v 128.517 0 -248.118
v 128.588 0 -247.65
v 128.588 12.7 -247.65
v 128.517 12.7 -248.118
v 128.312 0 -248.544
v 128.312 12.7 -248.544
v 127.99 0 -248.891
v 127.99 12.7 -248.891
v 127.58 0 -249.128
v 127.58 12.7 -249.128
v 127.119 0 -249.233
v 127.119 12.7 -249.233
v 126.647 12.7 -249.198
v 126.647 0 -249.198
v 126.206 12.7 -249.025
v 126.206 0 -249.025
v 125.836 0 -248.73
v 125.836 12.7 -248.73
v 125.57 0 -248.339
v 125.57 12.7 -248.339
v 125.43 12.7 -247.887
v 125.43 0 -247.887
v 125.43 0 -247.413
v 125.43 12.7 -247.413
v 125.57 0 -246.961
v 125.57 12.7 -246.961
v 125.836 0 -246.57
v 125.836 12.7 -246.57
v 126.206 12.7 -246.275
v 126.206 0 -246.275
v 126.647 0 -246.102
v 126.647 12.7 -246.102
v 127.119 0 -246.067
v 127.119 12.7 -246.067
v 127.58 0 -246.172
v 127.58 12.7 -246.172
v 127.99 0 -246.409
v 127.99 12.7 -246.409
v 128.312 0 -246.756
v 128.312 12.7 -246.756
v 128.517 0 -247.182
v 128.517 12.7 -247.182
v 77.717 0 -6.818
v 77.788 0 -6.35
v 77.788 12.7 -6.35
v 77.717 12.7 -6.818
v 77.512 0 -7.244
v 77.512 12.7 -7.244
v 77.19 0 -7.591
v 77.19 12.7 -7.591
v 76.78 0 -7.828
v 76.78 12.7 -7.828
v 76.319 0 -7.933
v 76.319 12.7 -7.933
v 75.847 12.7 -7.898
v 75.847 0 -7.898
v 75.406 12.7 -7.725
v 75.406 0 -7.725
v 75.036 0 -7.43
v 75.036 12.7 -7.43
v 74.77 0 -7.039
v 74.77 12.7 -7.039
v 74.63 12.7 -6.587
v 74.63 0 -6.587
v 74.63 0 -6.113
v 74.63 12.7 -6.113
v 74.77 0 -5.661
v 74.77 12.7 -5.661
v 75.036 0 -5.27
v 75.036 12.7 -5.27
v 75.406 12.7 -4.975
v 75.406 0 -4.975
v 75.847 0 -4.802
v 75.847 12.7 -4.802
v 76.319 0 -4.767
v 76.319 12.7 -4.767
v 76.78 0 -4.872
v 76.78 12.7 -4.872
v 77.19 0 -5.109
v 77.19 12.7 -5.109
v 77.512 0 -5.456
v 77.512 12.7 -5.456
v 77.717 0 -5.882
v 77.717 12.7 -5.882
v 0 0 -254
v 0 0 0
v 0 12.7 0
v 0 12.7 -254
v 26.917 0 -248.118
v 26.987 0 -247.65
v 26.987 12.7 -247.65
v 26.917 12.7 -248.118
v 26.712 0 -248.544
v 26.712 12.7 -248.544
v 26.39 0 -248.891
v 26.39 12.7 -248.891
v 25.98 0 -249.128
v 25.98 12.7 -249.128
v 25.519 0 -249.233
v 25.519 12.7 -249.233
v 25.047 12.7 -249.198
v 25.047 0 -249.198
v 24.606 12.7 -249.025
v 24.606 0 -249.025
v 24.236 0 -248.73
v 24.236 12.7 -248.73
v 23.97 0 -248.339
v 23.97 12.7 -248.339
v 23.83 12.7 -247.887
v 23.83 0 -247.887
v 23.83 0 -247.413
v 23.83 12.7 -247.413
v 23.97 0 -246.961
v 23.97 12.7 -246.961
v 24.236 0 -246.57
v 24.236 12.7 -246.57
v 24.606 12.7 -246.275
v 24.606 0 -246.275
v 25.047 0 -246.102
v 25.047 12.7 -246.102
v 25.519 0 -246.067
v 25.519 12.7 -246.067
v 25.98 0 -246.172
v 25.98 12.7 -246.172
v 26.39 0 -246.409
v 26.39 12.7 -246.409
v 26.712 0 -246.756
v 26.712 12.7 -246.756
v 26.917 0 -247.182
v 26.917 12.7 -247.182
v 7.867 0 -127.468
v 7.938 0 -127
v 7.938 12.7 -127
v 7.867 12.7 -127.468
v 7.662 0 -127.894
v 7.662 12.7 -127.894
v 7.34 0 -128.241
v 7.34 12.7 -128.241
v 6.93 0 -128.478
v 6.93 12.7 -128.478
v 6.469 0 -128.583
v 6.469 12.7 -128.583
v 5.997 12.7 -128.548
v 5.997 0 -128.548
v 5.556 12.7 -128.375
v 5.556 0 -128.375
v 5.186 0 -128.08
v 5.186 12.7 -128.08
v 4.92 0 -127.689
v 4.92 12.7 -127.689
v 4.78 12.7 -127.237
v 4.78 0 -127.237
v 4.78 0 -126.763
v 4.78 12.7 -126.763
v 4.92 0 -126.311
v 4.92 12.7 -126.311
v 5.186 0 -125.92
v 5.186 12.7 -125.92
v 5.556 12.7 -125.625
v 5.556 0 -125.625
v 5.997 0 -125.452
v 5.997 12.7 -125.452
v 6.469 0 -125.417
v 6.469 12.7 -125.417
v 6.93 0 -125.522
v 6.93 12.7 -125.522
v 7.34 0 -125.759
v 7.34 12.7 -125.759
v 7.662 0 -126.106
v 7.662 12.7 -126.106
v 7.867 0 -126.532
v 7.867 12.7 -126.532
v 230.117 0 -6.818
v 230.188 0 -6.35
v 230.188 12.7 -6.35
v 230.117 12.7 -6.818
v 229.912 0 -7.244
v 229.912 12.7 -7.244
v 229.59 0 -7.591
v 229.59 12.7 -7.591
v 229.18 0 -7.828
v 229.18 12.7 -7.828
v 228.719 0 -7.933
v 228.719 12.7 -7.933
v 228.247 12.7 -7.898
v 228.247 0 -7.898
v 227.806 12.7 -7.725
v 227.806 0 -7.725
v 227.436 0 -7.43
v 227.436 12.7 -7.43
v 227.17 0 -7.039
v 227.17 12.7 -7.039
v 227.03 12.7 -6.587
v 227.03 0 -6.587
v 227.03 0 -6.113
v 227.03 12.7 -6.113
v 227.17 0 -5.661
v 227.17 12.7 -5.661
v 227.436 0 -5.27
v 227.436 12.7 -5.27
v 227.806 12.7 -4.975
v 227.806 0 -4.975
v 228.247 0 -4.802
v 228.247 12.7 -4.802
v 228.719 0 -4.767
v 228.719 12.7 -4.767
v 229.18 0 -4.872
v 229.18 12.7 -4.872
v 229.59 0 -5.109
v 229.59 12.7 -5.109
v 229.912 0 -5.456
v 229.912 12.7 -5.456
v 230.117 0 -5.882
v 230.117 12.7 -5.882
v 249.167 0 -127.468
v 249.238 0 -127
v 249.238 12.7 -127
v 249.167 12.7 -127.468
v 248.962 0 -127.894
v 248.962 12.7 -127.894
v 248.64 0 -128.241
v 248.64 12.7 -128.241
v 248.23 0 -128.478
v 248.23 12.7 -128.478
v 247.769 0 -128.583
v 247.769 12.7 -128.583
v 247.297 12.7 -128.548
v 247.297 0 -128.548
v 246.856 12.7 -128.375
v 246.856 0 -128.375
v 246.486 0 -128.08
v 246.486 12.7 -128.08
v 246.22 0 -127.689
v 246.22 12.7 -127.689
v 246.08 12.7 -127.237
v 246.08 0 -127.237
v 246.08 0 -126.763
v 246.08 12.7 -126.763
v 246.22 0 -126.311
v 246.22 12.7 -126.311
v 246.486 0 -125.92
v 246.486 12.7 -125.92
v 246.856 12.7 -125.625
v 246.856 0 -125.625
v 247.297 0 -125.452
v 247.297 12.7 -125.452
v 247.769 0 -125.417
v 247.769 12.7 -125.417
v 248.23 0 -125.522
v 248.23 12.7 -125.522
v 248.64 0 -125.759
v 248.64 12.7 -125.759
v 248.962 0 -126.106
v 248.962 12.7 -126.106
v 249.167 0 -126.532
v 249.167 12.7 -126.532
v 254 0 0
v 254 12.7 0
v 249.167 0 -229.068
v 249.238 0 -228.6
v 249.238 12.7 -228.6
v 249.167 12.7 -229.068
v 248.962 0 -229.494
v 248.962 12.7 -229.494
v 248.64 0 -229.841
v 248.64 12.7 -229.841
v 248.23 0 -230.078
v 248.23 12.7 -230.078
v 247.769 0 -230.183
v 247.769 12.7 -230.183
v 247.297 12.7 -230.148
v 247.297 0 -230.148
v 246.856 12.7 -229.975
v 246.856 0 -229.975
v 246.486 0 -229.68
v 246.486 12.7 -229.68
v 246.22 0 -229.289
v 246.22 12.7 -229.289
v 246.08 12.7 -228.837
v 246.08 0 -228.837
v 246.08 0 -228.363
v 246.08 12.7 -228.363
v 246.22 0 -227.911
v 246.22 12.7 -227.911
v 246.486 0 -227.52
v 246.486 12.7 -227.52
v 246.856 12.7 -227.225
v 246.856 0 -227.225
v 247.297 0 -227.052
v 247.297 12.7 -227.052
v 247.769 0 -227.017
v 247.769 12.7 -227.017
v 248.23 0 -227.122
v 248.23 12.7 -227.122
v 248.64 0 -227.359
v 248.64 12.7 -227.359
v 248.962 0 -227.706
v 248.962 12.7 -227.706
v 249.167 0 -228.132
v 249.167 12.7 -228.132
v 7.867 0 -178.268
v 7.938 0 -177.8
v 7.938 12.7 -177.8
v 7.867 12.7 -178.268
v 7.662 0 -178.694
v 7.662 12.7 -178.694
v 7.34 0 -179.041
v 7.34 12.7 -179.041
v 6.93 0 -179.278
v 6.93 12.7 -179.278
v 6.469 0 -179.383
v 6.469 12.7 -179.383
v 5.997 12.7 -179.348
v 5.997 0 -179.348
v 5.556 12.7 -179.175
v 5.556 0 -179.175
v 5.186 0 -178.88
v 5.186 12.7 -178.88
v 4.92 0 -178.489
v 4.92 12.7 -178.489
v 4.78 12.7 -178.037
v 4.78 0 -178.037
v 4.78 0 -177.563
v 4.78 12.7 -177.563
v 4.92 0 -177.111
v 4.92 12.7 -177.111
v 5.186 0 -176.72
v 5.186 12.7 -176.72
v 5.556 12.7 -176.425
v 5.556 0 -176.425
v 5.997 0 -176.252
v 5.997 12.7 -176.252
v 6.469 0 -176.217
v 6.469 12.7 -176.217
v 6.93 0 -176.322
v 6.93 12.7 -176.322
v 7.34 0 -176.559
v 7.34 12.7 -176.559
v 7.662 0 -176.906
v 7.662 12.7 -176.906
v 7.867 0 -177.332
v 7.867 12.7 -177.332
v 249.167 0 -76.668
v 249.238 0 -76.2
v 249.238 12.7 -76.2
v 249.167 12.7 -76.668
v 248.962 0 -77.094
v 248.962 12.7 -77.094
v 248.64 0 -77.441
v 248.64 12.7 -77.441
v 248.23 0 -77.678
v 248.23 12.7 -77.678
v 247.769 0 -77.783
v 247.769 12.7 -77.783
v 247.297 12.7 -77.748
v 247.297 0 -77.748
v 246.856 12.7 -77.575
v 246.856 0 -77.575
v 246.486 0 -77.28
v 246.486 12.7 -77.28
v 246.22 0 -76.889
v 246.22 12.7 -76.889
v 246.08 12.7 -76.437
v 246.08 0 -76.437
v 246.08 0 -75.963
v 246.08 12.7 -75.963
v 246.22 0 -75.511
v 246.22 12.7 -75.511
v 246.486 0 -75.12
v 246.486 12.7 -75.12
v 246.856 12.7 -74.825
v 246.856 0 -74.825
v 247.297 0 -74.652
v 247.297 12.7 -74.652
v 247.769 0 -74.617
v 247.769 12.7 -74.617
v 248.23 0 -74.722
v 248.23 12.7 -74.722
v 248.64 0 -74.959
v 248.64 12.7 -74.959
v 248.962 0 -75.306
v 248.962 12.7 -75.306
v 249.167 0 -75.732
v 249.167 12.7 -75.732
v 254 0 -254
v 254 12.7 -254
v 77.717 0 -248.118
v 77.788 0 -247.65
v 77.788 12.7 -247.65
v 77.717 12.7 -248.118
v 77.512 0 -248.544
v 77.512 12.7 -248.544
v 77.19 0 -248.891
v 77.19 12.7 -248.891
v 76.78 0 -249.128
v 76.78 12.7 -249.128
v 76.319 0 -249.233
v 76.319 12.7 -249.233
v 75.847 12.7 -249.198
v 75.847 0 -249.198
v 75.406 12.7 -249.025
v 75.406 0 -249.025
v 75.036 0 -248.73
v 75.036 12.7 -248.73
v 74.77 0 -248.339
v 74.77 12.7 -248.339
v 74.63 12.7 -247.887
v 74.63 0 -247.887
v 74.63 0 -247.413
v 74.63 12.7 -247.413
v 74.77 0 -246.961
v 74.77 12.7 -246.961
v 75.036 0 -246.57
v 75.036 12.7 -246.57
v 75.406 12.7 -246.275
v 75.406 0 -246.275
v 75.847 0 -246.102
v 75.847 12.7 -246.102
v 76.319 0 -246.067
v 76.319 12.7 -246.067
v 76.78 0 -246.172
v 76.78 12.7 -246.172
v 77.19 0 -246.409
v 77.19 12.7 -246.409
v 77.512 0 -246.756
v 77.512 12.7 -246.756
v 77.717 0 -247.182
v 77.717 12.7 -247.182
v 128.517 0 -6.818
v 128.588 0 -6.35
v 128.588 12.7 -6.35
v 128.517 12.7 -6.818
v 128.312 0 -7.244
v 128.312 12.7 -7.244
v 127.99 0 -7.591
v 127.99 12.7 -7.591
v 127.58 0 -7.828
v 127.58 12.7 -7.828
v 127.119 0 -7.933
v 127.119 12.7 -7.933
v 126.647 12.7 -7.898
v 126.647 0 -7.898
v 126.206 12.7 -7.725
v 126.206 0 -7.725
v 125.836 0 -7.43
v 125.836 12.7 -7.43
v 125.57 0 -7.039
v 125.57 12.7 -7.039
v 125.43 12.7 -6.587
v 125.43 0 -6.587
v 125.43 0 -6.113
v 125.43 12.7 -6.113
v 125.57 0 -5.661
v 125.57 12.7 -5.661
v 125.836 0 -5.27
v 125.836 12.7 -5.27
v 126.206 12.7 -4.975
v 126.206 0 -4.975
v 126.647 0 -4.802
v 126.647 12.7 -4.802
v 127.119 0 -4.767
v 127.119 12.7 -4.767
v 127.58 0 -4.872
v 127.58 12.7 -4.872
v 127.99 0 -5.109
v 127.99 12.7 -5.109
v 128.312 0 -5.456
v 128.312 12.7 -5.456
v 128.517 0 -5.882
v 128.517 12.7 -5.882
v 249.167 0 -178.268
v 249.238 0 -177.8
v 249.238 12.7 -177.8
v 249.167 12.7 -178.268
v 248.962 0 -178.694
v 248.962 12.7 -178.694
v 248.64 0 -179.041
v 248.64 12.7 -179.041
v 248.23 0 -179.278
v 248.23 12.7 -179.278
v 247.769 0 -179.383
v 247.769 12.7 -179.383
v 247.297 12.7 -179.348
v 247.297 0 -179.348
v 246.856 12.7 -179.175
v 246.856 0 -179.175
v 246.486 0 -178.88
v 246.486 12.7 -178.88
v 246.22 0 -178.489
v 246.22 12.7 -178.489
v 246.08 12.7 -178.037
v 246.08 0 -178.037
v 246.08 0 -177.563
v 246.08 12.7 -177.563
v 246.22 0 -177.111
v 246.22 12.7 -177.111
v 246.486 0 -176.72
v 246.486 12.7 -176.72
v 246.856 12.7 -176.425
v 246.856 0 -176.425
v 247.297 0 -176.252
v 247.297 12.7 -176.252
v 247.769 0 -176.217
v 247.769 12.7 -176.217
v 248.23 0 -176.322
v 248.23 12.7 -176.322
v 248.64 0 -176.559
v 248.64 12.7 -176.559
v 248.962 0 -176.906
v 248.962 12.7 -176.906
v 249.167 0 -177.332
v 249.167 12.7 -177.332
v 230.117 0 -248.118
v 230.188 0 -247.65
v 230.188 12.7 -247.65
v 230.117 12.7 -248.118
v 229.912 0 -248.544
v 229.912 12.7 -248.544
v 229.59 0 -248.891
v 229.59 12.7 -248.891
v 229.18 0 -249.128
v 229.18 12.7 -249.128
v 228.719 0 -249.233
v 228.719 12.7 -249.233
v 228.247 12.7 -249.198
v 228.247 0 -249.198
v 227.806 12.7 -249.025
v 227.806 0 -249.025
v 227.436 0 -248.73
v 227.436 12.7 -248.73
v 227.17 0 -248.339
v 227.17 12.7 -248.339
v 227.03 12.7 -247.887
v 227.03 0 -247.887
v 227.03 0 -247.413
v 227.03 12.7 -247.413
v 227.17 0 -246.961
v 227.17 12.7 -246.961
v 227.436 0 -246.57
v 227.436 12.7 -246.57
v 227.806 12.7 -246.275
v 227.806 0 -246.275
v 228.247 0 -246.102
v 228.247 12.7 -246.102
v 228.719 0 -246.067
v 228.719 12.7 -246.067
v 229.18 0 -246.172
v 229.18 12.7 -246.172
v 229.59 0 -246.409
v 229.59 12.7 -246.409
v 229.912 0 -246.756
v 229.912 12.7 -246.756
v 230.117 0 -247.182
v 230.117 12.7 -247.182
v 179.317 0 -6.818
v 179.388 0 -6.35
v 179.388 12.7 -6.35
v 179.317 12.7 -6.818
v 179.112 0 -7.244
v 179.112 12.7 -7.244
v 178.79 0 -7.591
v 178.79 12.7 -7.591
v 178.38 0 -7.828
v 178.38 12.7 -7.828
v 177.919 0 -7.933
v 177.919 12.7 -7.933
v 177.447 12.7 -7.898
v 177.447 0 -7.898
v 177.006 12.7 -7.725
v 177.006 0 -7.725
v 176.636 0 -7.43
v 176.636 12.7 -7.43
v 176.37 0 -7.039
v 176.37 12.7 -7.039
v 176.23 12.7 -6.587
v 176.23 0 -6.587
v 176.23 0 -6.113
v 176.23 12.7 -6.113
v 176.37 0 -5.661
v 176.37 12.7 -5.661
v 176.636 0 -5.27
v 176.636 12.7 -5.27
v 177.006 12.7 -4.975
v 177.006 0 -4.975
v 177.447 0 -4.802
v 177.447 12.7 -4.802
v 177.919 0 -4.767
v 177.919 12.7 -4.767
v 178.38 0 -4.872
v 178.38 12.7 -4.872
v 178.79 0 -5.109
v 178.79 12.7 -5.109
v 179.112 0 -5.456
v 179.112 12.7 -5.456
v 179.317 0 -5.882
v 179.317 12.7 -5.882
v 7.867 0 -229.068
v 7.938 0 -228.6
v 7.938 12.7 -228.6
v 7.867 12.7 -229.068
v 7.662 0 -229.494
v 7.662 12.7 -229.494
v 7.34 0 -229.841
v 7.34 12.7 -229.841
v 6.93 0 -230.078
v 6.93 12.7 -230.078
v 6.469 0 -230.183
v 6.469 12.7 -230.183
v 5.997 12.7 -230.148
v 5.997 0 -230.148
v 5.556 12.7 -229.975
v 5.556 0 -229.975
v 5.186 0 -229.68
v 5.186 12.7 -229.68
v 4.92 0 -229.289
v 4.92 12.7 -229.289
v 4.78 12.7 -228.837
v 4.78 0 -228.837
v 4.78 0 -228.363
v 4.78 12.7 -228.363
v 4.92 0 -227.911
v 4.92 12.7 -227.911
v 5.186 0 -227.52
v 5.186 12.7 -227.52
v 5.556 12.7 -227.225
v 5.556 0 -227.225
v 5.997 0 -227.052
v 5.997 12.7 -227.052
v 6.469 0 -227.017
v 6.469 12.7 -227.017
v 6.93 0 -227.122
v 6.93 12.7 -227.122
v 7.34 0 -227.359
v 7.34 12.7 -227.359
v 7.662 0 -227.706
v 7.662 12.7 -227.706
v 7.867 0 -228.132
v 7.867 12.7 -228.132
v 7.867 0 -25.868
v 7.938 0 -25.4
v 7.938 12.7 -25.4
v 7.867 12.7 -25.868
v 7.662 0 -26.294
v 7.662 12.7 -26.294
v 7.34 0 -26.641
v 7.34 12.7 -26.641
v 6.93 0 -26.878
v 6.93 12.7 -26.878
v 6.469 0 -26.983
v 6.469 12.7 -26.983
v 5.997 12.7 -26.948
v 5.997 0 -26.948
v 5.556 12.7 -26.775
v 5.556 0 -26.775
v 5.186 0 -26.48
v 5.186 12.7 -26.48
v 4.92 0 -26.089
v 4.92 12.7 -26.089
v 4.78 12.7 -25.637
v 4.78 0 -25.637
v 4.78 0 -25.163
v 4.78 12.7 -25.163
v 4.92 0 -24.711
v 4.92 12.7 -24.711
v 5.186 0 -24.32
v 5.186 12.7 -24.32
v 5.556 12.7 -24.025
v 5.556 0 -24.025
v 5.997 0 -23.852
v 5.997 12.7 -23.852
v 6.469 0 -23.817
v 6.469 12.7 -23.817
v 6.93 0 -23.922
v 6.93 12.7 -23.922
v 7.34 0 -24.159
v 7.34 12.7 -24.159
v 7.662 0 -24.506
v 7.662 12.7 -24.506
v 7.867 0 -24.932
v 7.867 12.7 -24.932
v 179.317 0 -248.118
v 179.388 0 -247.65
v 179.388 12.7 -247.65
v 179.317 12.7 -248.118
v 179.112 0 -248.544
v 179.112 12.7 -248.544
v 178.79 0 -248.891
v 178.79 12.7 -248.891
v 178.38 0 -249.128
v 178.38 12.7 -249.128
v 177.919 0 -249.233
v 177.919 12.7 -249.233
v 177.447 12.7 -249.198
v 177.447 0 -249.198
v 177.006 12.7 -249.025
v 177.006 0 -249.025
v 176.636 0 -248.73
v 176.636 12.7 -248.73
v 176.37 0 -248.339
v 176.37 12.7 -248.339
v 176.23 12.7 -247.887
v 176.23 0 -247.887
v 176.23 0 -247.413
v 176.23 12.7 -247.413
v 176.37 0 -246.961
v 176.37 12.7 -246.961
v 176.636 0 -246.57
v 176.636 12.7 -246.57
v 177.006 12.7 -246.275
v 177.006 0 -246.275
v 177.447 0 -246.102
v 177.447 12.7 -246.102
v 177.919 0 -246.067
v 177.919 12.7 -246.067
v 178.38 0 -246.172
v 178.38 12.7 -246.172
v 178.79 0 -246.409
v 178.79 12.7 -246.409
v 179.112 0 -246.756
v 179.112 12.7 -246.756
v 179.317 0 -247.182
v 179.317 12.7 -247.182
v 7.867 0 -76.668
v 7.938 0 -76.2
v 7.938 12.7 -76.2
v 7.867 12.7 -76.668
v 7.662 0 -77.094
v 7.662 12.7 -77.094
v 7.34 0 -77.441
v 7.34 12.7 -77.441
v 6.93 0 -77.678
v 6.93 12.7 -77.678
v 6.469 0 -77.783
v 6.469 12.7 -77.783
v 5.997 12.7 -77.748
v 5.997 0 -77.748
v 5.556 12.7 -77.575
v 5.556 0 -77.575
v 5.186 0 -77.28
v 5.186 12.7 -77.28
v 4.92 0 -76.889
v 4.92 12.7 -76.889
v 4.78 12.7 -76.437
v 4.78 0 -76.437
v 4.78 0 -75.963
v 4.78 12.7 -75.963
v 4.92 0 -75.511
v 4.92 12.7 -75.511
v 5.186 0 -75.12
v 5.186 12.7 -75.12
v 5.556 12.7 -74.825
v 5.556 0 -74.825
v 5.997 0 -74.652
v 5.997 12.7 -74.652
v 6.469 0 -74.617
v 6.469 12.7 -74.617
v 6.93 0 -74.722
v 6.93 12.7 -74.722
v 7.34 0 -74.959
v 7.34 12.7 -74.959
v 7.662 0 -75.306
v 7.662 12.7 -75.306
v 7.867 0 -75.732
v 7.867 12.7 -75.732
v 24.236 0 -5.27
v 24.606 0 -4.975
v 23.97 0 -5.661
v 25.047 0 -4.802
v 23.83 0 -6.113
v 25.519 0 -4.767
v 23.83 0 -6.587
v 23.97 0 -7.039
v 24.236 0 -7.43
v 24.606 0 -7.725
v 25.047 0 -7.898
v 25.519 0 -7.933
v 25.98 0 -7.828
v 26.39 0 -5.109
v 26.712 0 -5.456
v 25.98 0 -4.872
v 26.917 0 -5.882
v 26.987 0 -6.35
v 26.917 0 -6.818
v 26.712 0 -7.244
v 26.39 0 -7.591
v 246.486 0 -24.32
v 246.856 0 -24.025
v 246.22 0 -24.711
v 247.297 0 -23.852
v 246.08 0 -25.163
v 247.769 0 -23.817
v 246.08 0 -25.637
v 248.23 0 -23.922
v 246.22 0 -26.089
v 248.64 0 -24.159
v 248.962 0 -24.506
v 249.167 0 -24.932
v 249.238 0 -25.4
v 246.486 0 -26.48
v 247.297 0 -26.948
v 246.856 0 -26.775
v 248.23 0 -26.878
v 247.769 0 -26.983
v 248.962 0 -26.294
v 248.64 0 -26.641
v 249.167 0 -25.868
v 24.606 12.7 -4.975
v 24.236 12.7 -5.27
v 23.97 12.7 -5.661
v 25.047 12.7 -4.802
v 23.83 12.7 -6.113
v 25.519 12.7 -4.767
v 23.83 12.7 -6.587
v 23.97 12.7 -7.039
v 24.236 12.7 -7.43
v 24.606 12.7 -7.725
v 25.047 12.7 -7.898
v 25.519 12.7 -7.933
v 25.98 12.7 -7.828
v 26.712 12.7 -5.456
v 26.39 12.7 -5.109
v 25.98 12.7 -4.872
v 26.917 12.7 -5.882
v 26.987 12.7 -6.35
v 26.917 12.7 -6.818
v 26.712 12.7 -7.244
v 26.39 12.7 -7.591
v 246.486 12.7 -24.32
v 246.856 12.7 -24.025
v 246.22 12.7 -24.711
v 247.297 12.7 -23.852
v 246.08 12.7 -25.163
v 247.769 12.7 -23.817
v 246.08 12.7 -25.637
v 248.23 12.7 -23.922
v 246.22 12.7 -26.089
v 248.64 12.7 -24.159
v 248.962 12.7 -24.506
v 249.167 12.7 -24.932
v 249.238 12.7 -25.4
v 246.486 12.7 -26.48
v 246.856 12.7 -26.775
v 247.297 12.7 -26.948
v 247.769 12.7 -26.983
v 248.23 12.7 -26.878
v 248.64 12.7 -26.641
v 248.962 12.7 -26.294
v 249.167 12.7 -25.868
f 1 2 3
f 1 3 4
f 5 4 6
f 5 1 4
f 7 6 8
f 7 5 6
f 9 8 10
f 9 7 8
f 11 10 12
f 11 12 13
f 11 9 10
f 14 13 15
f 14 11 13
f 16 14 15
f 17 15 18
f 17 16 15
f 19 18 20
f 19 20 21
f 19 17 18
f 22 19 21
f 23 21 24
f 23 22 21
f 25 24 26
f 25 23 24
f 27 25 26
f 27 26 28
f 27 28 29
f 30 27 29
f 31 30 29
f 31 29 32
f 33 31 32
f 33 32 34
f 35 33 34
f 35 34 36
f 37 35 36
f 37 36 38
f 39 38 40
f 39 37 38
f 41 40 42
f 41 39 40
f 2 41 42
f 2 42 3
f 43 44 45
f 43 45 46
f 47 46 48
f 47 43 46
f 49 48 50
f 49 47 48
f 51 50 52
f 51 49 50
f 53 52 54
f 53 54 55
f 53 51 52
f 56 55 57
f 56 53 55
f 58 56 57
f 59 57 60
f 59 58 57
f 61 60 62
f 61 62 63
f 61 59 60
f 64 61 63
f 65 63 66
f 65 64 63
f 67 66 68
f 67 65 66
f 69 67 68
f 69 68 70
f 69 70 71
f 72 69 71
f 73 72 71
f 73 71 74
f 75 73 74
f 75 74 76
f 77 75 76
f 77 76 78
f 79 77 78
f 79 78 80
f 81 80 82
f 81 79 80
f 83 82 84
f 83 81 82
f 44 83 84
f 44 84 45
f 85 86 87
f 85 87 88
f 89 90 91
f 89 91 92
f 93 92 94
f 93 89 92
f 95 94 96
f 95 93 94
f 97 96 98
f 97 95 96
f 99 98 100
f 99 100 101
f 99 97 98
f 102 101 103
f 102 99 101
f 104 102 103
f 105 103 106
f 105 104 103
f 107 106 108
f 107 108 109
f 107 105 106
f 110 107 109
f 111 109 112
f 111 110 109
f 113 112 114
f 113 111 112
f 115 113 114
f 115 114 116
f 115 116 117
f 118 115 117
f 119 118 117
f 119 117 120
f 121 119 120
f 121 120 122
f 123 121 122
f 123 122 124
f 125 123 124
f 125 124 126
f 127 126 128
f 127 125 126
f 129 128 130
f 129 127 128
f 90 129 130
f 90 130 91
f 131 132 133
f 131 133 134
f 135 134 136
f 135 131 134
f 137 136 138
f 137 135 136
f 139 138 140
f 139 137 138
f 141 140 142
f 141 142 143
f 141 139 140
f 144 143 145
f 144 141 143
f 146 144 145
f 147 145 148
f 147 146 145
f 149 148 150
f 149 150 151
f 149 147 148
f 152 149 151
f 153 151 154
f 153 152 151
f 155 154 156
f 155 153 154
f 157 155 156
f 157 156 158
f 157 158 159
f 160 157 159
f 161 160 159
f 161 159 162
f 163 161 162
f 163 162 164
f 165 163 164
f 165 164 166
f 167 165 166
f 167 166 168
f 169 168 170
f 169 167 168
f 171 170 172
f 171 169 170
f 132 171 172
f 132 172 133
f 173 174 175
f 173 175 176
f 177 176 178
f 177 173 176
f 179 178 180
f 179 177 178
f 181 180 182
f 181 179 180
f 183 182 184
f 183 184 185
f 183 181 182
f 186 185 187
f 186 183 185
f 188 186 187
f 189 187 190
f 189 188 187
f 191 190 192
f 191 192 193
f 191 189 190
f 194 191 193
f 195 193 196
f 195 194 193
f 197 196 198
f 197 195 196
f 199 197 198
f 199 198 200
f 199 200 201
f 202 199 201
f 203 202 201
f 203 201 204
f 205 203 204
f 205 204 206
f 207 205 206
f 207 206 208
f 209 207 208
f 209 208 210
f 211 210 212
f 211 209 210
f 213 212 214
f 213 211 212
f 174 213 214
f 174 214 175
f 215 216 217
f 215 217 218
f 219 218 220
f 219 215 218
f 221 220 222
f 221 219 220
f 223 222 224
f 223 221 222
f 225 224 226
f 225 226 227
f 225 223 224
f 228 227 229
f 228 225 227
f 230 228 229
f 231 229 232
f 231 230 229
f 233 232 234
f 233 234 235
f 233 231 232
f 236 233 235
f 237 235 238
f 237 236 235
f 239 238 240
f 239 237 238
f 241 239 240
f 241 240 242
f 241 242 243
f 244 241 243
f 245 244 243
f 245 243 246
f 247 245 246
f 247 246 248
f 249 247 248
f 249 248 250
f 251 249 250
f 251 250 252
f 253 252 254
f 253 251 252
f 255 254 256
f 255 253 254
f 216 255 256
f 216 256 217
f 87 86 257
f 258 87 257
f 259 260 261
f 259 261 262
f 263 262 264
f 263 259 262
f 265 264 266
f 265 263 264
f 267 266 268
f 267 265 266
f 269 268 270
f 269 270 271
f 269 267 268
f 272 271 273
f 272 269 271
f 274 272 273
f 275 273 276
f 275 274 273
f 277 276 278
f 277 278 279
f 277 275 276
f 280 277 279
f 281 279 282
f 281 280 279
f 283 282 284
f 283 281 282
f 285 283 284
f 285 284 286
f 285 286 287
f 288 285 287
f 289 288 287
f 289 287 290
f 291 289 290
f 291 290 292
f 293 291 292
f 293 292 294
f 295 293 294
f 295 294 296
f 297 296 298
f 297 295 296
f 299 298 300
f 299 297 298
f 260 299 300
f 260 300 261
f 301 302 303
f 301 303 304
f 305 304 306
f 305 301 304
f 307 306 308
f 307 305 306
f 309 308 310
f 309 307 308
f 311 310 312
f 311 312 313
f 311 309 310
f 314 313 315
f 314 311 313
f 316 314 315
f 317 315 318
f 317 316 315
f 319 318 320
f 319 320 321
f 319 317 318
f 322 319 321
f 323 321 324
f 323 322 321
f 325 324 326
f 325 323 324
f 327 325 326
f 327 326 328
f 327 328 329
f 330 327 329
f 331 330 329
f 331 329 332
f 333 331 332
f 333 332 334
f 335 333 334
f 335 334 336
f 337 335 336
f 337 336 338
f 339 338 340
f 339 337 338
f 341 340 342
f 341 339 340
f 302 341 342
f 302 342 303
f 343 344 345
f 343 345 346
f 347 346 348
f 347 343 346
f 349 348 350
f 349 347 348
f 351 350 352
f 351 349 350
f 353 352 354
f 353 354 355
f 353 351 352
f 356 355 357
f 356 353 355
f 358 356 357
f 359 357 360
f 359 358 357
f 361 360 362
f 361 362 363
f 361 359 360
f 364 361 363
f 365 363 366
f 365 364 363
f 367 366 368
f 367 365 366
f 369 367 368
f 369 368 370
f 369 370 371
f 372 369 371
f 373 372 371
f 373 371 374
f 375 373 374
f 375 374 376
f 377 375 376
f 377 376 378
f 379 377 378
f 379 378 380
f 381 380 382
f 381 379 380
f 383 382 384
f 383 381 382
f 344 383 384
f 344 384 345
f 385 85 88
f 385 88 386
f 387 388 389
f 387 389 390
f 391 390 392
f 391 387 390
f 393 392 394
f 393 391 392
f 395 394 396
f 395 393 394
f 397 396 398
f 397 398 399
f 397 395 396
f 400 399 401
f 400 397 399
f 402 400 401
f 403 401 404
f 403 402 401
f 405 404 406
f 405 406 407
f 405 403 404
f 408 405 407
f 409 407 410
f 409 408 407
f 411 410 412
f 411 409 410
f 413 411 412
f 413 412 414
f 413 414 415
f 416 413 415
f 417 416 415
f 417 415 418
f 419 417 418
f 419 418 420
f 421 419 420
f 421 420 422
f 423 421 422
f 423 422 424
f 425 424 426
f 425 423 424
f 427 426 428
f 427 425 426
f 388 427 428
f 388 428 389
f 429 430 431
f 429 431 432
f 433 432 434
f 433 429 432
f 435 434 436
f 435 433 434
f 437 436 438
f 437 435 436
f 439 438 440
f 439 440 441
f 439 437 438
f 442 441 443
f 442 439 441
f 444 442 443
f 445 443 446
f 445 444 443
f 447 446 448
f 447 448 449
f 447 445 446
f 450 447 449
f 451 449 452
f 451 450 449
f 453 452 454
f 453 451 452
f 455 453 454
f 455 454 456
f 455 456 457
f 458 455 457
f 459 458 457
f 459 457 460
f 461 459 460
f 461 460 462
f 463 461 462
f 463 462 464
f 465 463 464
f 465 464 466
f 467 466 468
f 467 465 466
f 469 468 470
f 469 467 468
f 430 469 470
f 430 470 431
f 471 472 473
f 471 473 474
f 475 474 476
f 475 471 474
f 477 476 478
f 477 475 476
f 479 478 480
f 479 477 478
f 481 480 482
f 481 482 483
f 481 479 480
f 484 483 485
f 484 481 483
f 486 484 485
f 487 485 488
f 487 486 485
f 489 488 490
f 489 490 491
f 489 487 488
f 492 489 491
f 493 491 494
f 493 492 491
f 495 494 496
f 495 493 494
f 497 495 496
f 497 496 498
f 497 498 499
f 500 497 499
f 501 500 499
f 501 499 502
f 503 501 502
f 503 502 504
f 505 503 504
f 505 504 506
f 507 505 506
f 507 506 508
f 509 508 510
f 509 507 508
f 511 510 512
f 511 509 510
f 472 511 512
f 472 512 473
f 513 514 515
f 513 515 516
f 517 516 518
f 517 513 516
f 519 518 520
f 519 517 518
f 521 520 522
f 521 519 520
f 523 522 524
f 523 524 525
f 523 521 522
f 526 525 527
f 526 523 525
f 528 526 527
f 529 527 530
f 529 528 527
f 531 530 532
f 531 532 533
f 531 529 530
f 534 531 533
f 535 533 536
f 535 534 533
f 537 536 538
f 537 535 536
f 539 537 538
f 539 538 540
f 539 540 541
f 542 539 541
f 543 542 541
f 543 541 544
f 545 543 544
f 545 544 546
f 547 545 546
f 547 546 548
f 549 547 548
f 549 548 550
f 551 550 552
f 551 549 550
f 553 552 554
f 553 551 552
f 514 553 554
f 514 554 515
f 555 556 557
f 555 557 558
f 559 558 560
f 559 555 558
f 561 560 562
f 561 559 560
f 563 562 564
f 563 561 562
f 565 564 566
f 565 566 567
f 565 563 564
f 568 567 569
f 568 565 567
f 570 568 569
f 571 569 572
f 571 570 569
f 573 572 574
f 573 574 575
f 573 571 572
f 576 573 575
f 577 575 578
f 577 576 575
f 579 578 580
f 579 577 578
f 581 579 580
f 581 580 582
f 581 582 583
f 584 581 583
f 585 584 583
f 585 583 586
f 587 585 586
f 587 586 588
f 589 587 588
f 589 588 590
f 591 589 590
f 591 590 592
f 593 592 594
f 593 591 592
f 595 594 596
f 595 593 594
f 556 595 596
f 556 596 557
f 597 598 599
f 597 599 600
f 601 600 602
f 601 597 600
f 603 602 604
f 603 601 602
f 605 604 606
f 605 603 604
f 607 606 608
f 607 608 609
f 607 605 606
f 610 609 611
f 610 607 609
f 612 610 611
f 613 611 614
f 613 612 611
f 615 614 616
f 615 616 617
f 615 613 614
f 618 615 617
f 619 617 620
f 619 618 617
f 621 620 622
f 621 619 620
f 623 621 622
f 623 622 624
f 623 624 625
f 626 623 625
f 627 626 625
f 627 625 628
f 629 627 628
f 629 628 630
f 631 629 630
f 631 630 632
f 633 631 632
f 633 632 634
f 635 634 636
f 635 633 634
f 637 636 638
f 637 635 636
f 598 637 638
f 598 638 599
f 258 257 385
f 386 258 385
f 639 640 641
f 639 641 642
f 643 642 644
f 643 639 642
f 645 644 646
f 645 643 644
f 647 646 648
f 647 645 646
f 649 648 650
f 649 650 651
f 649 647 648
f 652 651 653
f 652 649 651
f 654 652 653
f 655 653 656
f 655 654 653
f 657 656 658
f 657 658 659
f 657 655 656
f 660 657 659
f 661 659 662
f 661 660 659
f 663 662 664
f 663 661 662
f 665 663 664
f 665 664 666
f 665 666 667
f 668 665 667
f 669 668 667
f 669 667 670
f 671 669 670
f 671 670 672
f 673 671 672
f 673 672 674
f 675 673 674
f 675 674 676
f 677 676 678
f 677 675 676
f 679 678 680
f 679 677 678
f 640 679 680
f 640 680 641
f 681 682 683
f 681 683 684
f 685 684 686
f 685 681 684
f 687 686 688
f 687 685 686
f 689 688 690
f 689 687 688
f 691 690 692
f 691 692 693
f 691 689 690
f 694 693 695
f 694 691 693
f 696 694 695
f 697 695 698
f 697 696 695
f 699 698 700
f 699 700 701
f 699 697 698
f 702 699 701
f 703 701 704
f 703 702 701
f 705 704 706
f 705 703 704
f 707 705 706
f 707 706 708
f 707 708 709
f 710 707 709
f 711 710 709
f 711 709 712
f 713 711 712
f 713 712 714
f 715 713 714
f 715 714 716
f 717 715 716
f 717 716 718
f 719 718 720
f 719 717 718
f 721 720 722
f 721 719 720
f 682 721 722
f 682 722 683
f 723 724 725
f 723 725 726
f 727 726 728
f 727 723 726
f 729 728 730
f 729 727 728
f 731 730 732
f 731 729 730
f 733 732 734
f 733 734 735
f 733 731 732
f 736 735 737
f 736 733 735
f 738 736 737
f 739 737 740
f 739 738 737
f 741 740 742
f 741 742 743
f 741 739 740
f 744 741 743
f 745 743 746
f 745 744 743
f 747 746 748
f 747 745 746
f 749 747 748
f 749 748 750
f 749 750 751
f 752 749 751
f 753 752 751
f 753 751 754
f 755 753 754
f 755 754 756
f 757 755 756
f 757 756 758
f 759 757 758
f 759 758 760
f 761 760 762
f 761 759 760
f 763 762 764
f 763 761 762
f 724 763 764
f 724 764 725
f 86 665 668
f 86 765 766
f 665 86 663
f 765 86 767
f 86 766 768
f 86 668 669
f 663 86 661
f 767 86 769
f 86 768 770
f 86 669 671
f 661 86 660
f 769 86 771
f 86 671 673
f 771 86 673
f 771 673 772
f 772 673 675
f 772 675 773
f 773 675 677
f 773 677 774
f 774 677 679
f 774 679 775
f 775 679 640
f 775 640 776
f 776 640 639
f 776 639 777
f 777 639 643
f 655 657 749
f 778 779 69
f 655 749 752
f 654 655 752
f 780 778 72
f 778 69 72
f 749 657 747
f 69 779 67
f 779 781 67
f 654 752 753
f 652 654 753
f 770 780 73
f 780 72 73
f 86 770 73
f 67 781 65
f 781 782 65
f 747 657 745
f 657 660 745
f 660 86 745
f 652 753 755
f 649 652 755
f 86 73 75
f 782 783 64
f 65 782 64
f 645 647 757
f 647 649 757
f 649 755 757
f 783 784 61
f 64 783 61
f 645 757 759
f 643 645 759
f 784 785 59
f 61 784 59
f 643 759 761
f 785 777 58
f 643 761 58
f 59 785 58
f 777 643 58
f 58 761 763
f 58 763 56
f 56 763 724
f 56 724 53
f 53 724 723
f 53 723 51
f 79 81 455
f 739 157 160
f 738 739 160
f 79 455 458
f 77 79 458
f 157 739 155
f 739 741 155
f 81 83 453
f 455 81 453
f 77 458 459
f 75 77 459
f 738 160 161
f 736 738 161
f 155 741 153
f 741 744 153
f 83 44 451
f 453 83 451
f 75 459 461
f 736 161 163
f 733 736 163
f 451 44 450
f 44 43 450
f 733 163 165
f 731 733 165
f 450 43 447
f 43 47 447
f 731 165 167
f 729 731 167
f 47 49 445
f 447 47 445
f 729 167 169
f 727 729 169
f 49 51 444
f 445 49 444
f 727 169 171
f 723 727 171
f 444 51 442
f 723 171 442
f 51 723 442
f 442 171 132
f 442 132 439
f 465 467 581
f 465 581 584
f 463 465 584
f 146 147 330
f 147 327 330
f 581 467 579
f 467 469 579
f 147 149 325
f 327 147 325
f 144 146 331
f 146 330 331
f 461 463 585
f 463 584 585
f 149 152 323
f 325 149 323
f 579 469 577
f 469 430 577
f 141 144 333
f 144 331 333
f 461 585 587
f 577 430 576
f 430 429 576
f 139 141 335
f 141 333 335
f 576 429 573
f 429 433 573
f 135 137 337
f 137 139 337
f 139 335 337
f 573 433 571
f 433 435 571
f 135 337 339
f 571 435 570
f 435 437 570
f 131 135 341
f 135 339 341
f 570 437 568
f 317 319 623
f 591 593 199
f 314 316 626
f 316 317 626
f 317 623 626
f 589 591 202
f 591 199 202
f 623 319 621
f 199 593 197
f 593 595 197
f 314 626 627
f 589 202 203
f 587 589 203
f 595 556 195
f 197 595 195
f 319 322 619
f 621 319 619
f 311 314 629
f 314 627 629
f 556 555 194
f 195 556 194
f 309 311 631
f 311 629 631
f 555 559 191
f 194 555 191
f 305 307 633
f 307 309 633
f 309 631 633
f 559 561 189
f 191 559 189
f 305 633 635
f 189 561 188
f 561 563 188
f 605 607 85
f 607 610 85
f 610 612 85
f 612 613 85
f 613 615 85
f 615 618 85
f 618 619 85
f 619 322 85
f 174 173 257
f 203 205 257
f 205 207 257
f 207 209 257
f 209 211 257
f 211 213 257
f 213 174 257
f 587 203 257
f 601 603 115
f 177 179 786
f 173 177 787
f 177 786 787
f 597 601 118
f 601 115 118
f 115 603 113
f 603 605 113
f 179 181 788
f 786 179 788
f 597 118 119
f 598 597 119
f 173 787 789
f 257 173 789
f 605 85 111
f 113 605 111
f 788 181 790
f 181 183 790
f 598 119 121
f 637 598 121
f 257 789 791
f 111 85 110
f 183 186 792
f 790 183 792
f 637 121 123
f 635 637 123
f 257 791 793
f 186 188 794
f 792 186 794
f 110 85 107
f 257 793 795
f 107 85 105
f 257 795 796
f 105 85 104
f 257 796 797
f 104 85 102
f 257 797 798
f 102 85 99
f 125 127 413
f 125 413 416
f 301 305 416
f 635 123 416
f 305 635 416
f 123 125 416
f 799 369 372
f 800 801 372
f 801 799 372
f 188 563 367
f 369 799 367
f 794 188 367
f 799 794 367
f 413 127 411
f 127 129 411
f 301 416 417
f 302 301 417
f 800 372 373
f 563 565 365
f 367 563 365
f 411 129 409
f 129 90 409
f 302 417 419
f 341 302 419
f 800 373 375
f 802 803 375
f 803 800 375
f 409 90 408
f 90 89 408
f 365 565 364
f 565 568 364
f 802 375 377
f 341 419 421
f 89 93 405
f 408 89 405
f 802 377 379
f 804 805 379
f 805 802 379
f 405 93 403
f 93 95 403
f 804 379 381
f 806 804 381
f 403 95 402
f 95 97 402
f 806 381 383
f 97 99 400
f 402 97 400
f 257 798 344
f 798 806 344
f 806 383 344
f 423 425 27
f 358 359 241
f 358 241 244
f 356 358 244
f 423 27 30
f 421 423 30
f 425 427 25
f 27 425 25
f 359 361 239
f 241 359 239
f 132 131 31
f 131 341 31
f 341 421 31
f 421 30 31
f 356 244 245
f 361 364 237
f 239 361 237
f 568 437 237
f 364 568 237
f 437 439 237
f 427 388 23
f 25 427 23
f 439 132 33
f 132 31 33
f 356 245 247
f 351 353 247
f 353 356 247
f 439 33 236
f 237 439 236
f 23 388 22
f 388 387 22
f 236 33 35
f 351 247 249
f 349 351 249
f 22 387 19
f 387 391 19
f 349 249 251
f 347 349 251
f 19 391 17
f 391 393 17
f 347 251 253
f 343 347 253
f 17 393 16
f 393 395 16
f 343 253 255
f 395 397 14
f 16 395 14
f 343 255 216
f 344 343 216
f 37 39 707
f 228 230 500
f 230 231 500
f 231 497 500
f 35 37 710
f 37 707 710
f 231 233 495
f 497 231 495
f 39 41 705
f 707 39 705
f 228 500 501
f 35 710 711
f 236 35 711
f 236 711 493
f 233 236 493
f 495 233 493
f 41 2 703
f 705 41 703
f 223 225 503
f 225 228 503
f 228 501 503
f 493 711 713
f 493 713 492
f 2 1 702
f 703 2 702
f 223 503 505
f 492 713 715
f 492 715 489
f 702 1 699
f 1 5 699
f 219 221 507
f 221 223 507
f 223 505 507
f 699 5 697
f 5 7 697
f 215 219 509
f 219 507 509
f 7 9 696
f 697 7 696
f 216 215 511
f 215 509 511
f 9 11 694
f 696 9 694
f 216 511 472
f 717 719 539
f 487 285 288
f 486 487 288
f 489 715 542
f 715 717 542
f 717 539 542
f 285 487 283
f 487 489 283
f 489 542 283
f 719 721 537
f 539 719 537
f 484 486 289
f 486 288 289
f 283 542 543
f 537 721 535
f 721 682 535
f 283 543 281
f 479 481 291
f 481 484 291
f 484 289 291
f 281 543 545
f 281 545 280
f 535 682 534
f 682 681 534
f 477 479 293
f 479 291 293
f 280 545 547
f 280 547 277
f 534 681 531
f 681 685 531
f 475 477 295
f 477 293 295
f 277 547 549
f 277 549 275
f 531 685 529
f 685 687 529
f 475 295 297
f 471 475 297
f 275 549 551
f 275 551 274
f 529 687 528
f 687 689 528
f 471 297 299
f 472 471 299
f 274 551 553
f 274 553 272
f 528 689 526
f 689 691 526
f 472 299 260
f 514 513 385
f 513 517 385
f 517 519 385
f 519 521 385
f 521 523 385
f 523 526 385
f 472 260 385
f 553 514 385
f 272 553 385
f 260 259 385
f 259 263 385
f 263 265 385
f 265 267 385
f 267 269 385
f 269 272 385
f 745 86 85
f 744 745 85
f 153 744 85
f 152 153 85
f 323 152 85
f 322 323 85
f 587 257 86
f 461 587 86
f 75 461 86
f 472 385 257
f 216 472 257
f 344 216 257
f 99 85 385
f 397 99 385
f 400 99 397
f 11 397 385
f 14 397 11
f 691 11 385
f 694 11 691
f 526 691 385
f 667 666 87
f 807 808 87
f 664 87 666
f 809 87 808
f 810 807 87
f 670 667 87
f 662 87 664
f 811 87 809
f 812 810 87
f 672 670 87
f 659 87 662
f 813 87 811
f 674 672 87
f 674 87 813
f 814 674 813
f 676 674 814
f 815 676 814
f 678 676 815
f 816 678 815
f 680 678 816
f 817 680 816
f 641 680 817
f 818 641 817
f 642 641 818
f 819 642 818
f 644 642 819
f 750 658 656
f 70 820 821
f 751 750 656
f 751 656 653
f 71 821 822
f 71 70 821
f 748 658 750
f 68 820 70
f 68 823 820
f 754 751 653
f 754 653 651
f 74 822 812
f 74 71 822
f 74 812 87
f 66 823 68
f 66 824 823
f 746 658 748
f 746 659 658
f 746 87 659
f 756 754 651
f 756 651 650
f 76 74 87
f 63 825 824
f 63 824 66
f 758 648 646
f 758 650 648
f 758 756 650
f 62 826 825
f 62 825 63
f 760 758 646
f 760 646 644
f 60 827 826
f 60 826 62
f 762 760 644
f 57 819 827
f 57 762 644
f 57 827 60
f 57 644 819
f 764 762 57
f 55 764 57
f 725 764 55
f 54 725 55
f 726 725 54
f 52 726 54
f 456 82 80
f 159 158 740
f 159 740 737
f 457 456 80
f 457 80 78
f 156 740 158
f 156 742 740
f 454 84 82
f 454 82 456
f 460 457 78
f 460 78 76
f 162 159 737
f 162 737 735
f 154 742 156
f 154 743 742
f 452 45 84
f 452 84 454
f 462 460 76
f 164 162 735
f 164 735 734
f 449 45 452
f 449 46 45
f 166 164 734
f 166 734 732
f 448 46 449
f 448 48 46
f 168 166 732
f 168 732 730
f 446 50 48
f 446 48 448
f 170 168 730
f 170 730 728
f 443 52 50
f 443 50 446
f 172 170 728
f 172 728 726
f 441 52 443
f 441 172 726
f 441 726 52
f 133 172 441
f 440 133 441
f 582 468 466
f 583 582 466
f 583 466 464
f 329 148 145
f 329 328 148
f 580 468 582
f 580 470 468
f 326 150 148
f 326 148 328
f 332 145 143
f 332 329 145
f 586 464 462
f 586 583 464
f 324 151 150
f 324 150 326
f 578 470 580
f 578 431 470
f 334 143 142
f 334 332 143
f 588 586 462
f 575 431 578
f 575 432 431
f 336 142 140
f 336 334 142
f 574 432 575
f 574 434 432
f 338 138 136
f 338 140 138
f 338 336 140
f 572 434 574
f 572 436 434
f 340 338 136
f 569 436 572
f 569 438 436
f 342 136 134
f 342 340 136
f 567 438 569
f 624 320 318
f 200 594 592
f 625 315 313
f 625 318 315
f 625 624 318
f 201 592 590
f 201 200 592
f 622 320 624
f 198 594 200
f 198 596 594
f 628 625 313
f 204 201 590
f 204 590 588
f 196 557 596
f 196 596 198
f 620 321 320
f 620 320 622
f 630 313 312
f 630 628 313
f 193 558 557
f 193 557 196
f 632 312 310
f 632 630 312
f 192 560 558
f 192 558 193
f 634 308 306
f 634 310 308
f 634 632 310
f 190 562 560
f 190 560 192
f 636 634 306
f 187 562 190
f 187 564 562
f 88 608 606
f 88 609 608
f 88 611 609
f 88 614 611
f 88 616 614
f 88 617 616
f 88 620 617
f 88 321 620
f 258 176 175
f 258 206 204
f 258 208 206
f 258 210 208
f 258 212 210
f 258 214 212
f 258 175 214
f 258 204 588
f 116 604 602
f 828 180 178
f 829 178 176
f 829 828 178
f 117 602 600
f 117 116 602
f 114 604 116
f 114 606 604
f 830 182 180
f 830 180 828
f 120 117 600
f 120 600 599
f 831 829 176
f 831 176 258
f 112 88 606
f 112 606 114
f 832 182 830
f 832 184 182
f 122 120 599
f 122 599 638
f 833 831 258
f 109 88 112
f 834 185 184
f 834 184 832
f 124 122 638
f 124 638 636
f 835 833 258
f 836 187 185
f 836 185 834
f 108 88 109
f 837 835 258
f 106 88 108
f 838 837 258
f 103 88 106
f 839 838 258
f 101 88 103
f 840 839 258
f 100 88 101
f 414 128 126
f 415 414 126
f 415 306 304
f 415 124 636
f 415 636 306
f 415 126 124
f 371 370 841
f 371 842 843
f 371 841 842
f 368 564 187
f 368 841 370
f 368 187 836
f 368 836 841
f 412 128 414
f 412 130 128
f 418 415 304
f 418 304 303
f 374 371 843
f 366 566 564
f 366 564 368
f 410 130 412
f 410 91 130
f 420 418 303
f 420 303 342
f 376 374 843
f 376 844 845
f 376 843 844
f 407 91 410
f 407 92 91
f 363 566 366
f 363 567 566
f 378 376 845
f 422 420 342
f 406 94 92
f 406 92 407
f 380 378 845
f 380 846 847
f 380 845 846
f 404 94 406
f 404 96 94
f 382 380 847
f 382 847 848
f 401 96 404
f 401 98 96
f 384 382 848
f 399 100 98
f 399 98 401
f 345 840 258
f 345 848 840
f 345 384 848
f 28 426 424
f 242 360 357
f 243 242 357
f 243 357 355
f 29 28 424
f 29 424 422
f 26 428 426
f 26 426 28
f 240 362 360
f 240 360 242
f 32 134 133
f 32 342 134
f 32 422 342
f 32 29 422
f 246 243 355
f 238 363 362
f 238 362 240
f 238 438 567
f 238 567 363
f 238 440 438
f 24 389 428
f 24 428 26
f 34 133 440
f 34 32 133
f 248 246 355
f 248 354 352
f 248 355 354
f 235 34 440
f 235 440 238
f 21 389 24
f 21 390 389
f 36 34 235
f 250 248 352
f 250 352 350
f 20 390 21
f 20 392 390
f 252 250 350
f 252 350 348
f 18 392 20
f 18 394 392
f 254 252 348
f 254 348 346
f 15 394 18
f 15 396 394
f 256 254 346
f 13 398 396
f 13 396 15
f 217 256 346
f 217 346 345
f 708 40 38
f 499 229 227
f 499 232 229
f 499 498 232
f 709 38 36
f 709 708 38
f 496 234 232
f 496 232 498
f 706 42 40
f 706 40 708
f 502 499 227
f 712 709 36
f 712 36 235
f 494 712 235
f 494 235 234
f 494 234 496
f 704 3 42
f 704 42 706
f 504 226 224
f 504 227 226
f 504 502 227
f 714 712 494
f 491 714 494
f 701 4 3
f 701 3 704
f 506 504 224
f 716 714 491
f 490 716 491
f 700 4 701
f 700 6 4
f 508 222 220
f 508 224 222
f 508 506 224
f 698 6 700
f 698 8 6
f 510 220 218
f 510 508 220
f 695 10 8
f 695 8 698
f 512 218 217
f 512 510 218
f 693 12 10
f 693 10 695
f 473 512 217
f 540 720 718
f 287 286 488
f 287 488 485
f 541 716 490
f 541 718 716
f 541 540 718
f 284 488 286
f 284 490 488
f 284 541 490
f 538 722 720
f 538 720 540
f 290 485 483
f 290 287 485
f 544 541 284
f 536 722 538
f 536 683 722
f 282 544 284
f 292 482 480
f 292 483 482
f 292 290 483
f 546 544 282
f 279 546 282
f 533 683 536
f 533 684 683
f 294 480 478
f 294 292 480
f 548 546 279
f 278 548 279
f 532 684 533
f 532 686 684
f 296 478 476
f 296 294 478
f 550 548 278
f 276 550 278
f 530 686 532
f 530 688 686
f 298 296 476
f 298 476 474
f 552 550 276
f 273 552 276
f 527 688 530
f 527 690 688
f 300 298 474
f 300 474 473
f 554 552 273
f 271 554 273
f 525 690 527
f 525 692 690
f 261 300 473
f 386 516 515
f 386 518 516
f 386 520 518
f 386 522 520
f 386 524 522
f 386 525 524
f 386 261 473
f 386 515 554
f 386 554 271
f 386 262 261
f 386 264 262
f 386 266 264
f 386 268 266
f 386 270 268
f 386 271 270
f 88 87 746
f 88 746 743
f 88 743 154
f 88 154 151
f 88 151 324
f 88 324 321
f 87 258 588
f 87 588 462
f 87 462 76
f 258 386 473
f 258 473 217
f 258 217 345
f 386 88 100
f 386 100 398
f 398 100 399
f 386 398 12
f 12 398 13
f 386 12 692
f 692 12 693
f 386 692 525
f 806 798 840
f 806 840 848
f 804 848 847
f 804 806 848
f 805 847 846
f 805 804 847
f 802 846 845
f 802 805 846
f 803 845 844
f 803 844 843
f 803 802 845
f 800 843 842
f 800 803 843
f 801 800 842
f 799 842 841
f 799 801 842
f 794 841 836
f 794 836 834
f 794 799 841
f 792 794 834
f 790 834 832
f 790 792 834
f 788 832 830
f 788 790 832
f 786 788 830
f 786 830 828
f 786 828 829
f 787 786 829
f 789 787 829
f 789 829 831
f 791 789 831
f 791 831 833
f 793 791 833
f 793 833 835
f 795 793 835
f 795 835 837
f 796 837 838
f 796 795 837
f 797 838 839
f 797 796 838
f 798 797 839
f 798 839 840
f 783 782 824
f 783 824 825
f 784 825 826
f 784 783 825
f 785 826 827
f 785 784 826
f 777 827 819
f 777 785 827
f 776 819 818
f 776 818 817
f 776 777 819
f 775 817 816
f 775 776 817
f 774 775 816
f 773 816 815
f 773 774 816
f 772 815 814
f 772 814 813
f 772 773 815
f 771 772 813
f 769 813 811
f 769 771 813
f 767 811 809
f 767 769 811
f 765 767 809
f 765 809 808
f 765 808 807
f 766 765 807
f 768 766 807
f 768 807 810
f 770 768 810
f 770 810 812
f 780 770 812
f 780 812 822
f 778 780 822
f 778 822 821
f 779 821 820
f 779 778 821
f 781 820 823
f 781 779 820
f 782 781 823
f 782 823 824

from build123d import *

# Parameters (mm, degrees)
SKETCH1_W           = 254
SKETCH1_H           = 254
SKETCH1_R           = 1.5875
BOSS_EXTRUDE1_DEPTH = 12.7


with BuildPart() as part:
    # Sketch1 → Boss-Extrude1 (new body)
    with BuildSketch(Plane(origin=(0, 0, 0), x_dir=(1, 0, 0), z_dir=(0, 1, 0))):
        with Locations((127, 127)):
            Rectangle(SKETCH1_W, SKETCH1_H)
        with Locations((6.35, 25.4)):
            Circle(SKETCH1_R, mode=Mode.SUBTRACT)
        with Locations((247.65, 25.4)):
            Circle(SKETCH1_R, mode=Mode.SUBTRACT)
        with Locations((6.35, 76.2)):
            Circle(SKETCH1_R, mode=Mode.SUBTRACT)
        with Locations((247.65, 76.2)):
            Circle(SKETCH1_R, mode=Mode.SUBTRACT)
        with Locations((6.35, 127)):
            Circle(SKETCH1_R, mode=Mode.SUBTRACT)
        with Locations((247.65, 127)):
            Circle(SKETCH1_R, mode=Mode.SUBTRACT)
        with Locations((6.35, 177.8)):
            Circle(SKETCH1_R, mode=Mode.SUBTRACT)
        with Locations((247.65, 177.8)):
            Circle(SKETCH1_R, mode=Mode.SUBTRACT)
        with Locations((6.35, 228.6)):
            Circle(SKETCH1_R, mode=Mode.SUBTRACT)
        with Locations((247.65, 228.6)):
            Circle(SKETCH1_R, mode=Mode.SUBTRACT)
        with Locations((25.4, 6.35)):
            Circle(SKETCH1_R, mode=Mode.SUBTRACT)
        with Locations((76.2, 6.35)):
            Circle(SKETCH1_R, mode=Mode.SUBTRACT)
        with Locations((127, 6.35)):
            Circle(SKETCH1_R, mode=Mode.SUBTRACT)
        with Locations((177.8, 6.35)):
            Circle(SKETCH1_R, mode=Mode.SUBTRACT)
        with Locations((228.6, 6.35)):
            Circle(SKETCH1_R, mode=Mode.SUBTRACT)
        with Locations((25.4, 247.65)):
            Circle(SKETCH1_R, mode=Mode.SUBTRACT)
        with Locations((76.2, 247.65)):
            Circle(SKETCH1_R, mode=Mode.SUBTRACT)
        with Locations((127, 247.65)):
            Circle(SKETCH1_R, mode=Mode.SUBTRACT)
        with Locations((177.8, 247.65)):
            Circle(SKETCH1_R, mode=Mode.SUBTRACT)
        with Locations((228.6, 247.65)):
            Circle(SKETCH1_R, mode=Mode.SUBTRACT)
    extrude(amount=BOSS_EXTRUDE1_DEPTH)


solid = part.part
